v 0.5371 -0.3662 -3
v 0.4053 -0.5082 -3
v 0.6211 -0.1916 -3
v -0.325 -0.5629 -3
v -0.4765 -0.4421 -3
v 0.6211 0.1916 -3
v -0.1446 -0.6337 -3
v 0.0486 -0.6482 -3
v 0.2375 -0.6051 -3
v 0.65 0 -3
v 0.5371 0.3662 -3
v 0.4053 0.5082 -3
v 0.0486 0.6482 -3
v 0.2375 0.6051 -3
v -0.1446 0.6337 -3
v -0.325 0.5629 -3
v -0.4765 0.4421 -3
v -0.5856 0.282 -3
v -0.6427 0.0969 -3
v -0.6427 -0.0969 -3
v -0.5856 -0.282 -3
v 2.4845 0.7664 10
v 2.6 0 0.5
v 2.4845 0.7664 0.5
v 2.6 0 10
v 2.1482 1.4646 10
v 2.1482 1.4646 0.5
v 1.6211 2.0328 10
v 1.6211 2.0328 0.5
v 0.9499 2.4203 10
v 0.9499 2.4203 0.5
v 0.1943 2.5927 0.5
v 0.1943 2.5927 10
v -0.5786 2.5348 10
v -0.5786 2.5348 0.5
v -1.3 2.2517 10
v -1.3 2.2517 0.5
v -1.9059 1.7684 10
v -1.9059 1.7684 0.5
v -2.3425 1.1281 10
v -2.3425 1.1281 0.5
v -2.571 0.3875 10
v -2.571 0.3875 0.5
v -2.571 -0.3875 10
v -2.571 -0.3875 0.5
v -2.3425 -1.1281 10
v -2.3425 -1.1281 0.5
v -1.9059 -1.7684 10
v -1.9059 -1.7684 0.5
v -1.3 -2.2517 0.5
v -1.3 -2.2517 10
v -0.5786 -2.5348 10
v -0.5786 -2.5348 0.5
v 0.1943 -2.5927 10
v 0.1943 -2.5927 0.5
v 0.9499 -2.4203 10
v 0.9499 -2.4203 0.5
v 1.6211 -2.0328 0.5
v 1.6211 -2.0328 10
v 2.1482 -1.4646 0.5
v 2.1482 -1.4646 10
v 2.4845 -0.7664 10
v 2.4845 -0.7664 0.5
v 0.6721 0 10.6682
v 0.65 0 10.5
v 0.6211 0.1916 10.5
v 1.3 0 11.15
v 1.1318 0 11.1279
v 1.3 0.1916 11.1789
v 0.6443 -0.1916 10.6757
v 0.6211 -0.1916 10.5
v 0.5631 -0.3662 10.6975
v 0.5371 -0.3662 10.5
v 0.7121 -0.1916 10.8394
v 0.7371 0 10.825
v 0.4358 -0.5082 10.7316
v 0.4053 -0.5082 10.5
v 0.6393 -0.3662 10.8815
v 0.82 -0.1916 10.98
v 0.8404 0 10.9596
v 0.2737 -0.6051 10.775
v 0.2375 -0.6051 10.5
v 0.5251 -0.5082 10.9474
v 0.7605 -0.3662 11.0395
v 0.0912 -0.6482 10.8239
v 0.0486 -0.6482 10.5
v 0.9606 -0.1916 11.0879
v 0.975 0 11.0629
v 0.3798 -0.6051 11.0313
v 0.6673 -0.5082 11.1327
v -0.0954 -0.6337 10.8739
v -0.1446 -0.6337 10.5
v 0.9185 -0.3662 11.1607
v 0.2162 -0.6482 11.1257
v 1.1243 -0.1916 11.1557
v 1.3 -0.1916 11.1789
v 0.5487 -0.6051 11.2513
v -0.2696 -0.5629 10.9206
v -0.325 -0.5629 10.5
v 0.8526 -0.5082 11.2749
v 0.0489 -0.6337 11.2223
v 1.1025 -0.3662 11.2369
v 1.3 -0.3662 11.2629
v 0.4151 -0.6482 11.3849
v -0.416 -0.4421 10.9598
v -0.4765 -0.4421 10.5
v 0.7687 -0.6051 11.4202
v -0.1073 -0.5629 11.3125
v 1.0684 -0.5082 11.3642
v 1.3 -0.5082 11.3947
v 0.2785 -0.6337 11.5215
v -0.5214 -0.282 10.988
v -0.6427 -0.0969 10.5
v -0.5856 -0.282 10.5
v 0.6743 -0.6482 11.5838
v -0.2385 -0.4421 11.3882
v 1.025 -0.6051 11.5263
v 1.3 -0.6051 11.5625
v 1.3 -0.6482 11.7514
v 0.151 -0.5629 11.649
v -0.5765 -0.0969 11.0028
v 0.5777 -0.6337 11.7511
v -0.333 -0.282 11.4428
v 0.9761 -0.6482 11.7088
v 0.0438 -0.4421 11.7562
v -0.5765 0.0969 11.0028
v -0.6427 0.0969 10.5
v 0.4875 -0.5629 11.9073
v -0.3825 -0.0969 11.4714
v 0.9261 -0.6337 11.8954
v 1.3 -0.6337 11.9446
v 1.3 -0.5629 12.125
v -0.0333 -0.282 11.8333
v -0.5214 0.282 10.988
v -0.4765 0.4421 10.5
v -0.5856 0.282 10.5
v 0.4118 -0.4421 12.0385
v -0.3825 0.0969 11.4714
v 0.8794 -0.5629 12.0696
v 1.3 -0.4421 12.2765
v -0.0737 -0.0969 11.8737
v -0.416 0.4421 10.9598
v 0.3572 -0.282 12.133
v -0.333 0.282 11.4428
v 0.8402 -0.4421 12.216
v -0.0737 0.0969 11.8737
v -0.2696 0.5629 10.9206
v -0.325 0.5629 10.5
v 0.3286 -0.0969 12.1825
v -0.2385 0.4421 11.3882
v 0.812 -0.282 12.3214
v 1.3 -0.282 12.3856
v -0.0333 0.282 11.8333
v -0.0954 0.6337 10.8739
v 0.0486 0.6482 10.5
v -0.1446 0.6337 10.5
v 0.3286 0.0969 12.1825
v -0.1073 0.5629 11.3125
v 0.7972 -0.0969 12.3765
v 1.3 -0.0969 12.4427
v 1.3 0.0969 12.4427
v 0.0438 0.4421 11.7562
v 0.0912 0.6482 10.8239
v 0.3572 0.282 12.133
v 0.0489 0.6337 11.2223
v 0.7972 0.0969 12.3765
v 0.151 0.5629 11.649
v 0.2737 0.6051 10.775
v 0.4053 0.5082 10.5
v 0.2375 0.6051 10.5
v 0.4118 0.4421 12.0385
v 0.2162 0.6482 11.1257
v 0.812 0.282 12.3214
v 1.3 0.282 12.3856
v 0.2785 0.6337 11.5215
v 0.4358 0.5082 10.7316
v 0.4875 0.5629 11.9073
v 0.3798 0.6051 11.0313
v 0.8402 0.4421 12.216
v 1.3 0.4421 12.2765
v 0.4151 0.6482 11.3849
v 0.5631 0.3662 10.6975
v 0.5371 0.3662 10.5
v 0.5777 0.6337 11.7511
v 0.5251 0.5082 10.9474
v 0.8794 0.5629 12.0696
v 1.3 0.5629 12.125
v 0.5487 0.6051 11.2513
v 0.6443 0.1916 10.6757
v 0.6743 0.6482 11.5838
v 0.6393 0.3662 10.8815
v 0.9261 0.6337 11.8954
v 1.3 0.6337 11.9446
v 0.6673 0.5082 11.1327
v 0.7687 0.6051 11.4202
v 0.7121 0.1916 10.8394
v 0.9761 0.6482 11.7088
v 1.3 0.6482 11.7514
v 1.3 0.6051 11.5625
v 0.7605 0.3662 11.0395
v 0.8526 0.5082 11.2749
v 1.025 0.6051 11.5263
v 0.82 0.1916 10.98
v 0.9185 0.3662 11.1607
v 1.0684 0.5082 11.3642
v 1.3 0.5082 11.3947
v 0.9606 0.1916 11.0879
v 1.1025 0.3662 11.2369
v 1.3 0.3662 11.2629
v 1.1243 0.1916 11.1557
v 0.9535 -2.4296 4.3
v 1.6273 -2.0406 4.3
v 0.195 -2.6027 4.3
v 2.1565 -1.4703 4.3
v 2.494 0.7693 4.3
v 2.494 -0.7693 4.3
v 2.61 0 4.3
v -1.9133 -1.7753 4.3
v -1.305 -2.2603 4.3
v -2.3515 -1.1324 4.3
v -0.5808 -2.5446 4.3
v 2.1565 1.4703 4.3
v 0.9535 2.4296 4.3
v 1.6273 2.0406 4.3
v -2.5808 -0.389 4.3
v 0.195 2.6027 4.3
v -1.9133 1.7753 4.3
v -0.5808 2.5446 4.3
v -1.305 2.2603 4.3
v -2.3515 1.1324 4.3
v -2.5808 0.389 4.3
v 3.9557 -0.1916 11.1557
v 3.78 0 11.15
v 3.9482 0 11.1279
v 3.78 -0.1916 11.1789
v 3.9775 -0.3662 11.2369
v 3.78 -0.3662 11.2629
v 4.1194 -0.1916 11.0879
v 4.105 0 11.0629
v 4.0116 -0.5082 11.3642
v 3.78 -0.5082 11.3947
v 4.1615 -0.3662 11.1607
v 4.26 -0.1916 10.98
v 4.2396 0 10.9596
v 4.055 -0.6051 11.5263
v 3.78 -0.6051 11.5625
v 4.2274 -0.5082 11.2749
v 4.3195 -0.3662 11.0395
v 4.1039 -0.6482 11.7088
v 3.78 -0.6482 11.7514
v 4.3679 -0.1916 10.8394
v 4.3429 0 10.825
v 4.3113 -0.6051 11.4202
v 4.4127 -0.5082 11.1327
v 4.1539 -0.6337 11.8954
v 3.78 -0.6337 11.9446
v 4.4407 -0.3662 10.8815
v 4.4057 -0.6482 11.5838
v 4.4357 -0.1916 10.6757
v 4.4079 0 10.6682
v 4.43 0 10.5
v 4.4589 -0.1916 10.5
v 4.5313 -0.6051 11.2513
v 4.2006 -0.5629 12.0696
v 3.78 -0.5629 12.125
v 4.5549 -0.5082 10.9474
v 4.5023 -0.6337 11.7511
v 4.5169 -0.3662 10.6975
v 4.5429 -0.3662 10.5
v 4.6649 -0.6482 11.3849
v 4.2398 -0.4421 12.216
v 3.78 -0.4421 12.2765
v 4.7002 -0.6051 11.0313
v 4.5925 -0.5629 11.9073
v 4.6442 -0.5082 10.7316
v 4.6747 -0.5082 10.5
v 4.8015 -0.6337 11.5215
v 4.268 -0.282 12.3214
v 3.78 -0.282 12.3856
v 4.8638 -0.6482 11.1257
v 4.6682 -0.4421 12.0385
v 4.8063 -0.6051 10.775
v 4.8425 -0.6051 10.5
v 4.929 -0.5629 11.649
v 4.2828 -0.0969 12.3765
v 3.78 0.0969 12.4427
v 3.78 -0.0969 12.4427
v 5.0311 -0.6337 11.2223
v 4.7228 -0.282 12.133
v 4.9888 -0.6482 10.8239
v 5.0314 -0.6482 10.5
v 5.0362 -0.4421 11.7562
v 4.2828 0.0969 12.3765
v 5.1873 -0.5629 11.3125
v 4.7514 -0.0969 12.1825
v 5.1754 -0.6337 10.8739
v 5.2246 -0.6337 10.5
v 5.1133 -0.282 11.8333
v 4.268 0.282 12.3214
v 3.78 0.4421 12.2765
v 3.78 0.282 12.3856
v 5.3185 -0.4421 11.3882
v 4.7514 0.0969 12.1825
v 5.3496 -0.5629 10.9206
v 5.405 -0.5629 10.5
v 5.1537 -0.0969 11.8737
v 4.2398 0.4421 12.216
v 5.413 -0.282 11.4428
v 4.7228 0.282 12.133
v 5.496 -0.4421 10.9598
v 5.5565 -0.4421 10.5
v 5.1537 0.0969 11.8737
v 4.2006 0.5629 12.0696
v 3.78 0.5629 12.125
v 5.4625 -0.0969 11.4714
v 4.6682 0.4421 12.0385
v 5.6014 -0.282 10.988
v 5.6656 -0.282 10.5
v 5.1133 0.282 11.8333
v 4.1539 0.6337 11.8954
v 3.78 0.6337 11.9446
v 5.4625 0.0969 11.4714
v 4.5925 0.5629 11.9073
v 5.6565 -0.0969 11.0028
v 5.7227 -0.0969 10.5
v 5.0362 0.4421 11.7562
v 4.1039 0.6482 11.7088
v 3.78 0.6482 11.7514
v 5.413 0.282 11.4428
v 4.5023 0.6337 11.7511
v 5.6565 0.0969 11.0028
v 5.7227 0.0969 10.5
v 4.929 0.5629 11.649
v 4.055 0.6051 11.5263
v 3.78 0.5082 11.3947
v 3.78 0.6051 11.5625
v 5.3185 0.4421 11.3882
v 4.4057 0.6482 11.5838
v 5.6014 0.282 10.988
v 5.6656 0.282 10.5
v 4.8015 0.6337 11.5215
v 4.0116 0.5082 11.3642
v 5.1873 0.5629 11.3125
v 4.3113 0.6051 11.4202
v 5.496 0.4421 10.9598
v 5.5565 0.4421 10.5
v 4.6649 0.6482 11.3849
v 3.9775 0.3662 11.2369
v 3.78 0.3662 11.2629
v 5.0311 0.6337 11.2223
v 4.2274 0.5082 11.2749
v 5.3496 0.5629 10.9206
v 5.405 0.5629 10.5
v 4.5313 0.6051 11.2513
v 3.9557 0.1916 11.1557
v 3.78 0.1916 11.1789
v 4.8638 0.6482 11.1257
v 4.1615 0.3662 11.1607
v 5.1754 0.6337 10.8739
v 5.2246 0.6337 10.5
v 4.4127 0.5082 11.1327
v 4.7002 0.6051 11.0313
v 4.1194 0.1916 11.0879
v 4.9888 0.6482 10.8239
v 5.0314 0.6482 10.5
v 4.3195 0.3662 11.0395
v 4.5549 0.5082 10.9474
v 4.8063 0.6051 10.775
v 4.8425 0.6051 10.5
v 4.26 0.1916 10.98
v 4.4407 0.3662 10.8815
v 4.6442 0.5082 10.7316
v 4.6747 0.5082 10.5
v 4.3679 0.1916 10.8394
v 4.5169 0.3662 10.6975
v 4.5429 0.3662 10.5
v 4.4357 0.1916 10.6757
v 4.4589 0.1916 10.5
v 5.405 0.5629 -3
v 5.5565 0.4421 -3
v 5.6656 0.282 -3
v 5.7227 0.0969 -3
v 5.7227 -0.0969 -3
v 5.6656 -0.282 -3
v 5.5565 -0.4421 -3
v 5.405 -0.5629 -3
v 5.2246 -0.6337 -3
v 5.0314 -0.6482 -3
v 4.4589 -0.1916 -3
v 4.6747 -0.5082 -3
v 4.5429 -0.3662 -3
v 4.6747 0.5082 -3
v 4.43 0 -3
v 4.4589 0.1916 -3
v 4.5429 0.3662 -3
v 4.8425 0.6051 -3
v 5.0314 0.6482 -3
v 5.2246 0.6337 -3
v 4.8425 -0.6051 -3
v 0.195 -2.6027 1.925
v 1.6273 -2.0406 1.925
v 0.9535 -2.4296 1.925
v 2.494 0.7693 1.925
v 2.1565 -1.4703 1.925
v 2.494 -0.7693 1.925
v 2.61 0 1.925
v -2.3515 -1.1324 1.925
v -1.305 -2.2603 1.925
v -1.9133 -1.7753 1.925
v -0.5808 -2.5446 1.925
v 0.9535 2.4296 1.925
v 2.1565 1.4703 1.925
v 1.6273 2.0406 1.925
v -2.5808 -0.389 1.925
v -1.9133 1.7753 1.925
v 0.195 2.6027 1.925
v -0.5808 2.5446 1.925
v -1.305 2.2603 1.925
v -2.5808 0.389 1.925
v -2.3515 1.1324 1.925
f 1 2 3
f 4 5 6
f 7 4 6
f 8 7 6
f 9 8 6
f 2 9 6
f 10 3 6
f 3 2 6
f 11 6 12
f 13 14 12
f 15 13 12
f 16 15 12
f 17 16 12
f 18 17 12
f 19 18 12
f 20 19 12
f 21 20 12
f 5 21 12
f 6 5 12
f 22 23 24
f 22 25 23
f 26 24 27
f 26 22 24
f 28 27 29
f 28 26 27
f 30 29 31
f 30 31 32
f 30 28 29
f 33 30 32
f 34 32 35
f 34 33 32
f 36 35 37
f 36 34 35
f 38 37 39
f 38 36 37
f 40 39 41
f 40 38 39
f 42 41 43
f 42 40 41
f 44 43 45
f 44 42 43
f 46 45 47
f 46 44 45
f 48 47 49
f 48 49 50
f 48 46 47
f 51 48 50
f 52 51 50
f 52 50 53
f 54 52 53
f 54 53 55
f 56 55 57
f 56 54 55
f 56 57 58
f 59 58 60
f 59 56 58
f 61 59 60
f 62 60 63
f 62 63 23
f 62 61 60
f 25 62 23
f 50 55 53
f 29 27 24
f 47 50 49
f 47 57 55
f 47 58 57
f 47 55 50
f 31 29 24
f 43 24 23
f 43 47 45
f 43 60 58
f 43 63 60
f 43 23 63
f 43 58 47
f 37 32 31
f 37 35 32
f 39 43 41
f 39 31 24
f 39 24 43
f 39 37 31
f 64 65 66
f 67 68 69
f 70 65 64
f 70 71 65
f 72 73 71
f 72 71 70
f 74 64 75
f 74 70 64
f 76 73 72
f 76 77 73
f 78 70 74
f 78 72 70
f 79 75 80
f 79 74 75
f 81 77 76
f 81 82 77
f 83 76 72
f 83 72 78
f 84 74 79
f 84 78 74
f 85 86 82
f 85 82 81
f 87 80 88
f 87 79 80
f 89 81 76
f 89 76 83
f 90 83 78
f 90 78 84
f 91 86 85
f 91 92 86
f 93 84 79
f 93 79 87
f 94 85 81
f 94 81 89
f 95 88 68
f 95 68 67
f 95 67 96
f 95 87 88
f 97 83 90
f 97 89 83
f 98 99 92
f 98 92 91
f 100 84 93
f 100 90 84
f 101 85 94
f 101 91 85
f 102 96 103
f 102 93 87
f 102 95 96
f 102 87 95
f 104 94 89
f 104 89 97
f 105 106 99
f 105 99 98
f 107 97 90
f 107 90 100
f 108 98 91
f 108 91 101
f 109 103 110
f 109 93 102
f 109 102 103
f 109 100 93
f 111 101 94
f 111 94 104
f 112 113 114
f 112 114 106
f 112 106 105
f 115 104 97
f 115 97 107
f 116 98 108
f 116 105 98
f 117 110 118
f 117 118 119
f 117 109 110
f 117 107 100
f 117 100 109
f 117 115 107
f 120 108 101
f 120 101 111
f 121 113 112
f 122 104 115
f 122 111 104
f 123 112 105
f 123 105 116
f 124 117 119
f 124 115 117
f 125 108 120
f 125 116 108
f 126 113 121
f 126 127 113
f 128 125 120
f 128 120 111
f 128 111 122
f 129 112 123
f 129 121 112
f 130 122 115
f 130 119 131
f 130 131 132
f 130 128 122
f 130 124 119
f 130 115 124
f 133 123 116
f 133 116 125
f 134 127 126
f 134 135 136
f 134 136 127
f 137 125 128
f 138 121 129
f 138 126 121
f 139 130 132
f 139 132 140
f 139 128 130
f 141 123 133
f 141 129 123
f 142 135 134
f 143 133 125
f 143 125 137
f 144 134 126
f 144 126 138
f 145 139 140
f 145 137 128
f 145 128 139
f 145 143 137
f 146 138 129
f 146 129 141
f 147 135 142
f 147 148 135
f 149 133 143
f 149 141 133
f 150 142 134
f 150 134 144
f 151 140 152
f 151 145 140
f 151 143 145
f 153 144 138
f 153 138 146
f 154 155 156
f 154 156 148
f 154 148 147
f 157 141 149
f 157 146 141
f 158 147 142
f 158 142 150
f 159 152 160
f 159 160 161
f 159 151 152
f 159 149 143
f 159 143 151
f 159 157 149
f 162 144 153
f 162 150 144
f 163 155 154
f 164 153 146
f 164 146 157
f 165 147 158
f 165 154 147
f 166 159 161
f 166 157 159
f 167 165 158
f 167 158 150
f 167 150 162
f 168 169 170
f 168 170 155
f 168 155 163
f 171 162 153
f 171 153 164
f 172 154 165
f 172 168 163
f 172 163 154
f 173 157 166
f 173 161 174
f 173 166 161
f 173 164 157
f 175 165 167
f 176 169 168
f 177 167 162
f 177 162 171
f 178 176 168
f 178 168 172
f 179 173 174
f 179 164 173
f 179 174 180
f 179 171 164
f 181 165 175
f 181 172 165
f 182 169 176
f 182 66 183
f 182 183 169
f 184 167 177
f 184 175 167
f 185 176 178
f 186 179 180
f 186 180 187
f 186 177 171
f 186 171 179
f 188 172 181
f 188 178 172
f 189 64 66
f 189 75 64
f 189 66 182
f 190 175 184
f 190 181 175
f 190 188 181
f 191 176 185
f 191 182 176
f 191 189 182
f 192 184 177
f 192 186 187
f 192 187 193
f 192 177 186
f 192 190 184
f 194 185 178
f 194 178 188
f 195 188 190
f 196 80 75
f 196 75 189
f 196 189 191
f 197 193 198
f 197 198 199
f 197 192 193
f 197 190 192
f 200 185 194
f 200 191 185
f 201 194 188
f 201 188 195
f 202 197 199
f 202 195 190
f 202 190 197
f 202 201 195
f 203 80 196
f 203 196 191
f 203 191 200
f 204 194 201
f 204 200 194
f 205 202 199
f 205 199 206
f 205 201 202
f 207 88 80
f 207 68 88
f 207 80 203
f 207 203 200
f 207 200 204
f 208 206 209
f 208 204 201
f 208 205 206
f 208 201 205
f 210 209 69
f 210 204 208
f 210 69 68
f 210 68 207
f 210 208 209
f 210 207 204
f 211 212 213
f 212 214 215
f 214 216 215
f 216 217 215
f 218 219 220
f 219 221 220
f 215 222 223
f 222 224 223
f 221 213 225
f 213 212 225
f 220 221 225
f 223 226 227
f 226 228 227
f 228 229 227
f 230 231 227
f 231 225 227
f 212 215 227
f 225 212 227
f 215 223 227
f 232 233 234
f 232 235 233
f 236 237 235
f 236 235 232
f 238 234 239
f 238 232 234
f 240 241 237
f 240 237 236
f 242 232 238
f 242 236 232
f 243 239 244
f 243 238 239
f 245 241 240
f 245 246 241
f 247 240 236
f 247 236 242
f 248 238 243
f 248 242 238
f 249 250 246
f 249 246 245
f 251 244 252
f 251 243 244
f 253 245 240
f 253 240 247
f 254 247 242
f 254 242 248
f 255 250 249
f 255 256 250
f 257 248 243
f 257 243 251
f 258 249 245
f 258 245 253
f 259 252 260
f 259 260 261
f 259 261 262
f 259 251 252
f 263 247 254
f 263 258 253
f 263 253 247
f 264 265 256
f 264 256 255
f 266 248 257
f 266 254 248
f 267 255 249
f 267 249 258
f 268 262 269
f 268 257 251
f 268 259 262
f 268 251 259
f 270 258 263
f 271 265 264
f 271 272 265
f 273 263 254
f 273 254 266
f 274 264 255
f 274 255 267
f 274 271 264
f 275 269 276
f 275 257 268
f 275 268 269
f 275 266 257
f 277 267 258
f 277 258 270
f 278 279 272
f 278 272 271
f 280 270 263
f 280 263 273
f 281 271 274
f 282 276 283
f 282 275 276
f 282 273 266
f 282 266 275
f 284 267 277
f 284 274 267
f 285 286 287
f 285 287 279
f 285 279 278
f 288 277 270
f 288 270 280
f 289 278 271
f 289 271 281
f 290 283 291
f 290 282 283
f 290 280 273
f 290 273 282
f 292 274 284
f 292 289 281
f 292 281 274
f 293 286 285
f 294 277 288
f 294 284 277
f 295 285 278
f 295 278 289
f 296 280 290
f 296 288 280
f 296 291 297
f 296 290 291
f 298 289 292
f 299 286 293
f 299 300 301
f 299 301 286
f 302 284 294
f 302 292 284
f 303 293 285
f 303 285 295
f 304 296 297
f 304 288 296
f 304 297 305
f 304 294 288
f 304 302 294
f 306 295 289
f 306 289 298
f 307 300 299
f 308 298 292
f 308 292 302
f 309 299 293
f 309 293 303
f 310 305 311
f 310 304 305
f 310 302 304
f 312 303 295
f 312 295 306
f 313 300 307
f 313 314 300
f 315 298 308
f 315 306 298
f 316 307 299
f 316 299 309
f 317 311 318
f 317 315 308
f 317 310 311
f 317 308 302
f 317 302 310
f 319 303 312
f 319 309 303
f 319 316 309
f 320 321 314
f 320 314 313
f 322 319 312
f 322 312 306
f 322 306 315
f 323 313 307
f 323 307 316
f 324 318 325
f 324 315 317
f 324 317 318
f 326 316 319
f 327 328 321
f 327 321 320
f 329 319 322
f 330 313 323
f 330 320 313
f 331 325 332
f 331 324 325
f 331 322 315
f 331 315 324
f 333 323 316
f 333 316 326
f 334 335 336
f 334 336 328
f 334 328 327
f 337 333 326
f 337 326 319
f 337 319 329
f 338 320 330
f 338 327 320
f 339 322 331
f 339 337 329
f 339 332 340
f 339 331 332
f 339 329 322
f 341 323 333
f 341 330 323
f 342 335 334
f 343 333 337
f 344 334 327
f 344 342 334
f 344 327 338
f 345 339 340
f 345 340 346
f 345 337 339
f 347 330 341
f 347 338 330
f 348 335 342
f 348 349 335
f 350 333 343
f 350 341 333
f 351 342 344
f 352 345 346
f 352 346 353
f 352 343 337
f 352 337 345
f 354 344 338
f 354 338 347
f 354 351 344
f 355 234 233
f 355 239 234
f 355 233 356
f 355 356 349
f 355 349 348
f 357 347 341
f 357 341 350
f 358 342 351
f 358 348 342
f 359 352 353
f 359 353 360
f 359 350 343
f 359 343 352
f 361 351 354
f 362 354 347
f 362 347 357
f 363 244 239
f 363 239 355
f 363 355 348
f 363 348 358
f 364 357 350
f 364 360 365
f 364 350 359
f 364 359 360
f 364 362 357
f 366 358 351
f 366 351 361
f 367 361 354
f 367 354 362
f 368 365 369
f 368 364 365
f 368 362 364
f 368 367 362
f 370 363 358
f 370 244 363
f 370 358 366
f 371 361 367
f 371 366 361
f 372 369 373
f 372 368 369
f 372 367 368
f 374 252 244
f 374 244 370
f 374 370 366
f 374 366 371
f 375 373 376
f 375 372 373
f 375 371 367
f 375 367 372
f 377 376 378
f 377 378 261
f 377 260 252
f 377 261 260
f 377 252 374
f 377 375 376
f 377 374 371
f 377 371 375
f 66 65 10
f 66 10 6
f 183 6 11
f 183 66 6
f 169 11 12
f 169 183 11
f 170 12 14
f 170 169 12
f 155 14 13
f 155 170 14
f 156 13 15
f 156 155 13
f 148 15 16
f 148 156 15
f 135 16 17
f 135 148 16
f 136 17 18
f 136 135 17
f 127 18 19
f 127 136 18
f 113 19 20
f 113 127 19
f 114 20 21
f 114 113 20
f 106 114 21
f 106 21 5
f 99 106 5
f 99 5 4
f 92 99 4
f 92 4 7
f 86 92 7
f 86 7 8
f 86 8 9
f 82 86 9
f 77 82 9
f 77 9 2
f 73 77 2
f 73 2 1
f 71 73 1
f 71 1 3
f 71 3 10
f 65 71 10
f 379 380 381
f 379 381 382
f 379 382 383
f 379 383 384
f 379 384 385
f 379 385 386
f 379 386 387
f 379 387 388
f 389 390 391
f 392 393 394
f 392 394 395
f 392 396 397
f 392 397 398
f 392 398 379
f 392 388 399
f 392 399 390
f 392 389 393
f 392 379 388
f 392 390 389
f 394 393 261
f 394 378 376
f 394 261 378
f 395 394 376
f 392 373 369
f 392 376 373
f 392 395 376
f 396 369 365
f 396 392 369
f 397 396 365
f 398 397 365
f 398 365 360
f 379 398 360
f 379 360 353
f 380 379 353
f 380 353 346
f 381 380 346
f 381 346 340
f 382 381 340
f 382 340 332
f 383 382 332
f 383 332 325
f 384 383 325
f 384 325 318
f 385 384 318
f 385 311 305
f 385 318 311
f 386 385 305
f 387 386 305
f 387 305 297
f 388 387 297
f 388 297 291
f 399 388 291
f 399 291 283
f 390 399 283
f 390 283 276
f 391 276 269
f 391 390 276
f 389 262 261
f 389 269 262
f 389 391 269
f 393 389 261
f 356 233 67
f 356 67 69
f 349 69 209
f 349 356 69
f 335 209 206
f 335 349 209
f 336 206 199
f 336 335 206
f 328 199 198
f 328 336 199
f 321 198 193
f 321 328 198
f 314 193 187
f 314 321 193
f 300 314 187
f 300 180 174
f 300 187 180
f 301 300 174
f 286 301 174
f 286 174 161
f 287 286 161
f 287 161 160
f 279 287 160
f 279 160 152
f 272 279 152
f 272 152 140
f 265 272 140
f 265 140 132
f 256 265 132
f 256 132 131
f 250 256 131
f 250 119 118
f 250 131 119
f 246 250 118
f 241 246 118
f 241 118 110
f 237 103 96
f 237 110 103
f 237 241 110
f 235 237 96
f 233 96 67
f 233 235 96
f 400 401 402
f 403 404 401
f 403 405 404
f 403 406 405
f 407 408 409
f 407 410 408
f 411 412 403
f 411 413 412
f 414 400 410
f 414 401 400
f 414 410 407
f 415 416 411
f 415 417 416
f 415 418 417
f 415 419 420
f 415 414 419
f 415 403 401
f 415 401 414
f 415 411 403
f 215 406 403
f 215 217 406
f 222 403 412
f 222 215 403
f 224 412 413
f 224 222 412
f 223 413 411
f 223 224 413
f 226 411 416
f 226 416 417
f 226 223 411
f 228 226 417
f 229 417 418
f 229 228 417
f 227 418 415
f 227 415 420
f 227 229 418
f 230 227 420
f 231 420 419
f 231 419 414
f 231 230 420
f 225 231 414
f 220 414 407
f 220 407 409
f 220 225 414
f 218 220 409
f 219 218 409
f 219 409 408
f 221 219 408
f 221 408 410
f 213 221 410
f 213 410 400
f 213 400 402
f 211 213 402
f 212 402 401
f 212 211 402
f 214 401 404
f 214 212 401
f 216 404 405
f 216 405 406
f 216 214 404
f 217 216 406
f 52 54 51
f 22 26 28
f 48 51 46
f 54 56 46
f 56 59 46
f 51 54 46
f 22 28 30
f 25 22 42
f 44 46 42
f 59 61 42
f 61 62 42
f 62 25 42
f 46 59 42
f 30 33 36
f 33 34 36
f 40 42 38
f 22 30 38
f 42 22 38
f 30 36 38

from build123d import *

# Parameters (mm, degrees)
SKETCH001_R = 0.65
SKETCH002_W = 2.6
SKETCH002_H = 9.5
SKETCH003_W = 2.61
SKETCH003_H = 2.375


with BuildPart() as sweep_body:
    # Sweep: sweep along a path in Sketch
    with BuildLine(Plane.XZ) as sweep_path:
        Line((0, -3), (0, 10.5))
        ThreePointArc((0, 10.5), (0.380761, 11.419239), (1.3, 11.8))
        Line((1.3, 11.8), (3.78, 11.8))
        ThreePointArc((3.78, 11.8), (4.699239, 11.419239), (5.08, 10.5))
        Line((5.08, 10.5), (5.08, -3))
    # Sketch001 → Sweep (sweep)
    with BuildSketch(Plane.XY):
        Circle(SKETCH001_R)
    sweep(path=sweep_path.line)


with BuildPart() as revolution:
    # Sketch002 → Revolution (revolve)
    with BuildSketch(Plane.XZ):
        with Locations((1.3, 5.25)):
            Rectangle(SKETCH002_W, SKETCH002_H)
    revolve(axis=Axis((0, 0, 0.5), (0, 0, 1)))


with BuildPart() as revolution001:
    # Sketch003 → Revolution001 (revolve)
    with BuildSketch(Plane.XZ):
        with Locations((1.305, 3.1125)):
            Rectangle(SKETCH003_W, SKETCH003_H)
    revolve(axis=Axis((0, 0, 0), (0, 0, 1)))


solid = Compound([sweep_body.part, revolution.part, revolution001.part])
